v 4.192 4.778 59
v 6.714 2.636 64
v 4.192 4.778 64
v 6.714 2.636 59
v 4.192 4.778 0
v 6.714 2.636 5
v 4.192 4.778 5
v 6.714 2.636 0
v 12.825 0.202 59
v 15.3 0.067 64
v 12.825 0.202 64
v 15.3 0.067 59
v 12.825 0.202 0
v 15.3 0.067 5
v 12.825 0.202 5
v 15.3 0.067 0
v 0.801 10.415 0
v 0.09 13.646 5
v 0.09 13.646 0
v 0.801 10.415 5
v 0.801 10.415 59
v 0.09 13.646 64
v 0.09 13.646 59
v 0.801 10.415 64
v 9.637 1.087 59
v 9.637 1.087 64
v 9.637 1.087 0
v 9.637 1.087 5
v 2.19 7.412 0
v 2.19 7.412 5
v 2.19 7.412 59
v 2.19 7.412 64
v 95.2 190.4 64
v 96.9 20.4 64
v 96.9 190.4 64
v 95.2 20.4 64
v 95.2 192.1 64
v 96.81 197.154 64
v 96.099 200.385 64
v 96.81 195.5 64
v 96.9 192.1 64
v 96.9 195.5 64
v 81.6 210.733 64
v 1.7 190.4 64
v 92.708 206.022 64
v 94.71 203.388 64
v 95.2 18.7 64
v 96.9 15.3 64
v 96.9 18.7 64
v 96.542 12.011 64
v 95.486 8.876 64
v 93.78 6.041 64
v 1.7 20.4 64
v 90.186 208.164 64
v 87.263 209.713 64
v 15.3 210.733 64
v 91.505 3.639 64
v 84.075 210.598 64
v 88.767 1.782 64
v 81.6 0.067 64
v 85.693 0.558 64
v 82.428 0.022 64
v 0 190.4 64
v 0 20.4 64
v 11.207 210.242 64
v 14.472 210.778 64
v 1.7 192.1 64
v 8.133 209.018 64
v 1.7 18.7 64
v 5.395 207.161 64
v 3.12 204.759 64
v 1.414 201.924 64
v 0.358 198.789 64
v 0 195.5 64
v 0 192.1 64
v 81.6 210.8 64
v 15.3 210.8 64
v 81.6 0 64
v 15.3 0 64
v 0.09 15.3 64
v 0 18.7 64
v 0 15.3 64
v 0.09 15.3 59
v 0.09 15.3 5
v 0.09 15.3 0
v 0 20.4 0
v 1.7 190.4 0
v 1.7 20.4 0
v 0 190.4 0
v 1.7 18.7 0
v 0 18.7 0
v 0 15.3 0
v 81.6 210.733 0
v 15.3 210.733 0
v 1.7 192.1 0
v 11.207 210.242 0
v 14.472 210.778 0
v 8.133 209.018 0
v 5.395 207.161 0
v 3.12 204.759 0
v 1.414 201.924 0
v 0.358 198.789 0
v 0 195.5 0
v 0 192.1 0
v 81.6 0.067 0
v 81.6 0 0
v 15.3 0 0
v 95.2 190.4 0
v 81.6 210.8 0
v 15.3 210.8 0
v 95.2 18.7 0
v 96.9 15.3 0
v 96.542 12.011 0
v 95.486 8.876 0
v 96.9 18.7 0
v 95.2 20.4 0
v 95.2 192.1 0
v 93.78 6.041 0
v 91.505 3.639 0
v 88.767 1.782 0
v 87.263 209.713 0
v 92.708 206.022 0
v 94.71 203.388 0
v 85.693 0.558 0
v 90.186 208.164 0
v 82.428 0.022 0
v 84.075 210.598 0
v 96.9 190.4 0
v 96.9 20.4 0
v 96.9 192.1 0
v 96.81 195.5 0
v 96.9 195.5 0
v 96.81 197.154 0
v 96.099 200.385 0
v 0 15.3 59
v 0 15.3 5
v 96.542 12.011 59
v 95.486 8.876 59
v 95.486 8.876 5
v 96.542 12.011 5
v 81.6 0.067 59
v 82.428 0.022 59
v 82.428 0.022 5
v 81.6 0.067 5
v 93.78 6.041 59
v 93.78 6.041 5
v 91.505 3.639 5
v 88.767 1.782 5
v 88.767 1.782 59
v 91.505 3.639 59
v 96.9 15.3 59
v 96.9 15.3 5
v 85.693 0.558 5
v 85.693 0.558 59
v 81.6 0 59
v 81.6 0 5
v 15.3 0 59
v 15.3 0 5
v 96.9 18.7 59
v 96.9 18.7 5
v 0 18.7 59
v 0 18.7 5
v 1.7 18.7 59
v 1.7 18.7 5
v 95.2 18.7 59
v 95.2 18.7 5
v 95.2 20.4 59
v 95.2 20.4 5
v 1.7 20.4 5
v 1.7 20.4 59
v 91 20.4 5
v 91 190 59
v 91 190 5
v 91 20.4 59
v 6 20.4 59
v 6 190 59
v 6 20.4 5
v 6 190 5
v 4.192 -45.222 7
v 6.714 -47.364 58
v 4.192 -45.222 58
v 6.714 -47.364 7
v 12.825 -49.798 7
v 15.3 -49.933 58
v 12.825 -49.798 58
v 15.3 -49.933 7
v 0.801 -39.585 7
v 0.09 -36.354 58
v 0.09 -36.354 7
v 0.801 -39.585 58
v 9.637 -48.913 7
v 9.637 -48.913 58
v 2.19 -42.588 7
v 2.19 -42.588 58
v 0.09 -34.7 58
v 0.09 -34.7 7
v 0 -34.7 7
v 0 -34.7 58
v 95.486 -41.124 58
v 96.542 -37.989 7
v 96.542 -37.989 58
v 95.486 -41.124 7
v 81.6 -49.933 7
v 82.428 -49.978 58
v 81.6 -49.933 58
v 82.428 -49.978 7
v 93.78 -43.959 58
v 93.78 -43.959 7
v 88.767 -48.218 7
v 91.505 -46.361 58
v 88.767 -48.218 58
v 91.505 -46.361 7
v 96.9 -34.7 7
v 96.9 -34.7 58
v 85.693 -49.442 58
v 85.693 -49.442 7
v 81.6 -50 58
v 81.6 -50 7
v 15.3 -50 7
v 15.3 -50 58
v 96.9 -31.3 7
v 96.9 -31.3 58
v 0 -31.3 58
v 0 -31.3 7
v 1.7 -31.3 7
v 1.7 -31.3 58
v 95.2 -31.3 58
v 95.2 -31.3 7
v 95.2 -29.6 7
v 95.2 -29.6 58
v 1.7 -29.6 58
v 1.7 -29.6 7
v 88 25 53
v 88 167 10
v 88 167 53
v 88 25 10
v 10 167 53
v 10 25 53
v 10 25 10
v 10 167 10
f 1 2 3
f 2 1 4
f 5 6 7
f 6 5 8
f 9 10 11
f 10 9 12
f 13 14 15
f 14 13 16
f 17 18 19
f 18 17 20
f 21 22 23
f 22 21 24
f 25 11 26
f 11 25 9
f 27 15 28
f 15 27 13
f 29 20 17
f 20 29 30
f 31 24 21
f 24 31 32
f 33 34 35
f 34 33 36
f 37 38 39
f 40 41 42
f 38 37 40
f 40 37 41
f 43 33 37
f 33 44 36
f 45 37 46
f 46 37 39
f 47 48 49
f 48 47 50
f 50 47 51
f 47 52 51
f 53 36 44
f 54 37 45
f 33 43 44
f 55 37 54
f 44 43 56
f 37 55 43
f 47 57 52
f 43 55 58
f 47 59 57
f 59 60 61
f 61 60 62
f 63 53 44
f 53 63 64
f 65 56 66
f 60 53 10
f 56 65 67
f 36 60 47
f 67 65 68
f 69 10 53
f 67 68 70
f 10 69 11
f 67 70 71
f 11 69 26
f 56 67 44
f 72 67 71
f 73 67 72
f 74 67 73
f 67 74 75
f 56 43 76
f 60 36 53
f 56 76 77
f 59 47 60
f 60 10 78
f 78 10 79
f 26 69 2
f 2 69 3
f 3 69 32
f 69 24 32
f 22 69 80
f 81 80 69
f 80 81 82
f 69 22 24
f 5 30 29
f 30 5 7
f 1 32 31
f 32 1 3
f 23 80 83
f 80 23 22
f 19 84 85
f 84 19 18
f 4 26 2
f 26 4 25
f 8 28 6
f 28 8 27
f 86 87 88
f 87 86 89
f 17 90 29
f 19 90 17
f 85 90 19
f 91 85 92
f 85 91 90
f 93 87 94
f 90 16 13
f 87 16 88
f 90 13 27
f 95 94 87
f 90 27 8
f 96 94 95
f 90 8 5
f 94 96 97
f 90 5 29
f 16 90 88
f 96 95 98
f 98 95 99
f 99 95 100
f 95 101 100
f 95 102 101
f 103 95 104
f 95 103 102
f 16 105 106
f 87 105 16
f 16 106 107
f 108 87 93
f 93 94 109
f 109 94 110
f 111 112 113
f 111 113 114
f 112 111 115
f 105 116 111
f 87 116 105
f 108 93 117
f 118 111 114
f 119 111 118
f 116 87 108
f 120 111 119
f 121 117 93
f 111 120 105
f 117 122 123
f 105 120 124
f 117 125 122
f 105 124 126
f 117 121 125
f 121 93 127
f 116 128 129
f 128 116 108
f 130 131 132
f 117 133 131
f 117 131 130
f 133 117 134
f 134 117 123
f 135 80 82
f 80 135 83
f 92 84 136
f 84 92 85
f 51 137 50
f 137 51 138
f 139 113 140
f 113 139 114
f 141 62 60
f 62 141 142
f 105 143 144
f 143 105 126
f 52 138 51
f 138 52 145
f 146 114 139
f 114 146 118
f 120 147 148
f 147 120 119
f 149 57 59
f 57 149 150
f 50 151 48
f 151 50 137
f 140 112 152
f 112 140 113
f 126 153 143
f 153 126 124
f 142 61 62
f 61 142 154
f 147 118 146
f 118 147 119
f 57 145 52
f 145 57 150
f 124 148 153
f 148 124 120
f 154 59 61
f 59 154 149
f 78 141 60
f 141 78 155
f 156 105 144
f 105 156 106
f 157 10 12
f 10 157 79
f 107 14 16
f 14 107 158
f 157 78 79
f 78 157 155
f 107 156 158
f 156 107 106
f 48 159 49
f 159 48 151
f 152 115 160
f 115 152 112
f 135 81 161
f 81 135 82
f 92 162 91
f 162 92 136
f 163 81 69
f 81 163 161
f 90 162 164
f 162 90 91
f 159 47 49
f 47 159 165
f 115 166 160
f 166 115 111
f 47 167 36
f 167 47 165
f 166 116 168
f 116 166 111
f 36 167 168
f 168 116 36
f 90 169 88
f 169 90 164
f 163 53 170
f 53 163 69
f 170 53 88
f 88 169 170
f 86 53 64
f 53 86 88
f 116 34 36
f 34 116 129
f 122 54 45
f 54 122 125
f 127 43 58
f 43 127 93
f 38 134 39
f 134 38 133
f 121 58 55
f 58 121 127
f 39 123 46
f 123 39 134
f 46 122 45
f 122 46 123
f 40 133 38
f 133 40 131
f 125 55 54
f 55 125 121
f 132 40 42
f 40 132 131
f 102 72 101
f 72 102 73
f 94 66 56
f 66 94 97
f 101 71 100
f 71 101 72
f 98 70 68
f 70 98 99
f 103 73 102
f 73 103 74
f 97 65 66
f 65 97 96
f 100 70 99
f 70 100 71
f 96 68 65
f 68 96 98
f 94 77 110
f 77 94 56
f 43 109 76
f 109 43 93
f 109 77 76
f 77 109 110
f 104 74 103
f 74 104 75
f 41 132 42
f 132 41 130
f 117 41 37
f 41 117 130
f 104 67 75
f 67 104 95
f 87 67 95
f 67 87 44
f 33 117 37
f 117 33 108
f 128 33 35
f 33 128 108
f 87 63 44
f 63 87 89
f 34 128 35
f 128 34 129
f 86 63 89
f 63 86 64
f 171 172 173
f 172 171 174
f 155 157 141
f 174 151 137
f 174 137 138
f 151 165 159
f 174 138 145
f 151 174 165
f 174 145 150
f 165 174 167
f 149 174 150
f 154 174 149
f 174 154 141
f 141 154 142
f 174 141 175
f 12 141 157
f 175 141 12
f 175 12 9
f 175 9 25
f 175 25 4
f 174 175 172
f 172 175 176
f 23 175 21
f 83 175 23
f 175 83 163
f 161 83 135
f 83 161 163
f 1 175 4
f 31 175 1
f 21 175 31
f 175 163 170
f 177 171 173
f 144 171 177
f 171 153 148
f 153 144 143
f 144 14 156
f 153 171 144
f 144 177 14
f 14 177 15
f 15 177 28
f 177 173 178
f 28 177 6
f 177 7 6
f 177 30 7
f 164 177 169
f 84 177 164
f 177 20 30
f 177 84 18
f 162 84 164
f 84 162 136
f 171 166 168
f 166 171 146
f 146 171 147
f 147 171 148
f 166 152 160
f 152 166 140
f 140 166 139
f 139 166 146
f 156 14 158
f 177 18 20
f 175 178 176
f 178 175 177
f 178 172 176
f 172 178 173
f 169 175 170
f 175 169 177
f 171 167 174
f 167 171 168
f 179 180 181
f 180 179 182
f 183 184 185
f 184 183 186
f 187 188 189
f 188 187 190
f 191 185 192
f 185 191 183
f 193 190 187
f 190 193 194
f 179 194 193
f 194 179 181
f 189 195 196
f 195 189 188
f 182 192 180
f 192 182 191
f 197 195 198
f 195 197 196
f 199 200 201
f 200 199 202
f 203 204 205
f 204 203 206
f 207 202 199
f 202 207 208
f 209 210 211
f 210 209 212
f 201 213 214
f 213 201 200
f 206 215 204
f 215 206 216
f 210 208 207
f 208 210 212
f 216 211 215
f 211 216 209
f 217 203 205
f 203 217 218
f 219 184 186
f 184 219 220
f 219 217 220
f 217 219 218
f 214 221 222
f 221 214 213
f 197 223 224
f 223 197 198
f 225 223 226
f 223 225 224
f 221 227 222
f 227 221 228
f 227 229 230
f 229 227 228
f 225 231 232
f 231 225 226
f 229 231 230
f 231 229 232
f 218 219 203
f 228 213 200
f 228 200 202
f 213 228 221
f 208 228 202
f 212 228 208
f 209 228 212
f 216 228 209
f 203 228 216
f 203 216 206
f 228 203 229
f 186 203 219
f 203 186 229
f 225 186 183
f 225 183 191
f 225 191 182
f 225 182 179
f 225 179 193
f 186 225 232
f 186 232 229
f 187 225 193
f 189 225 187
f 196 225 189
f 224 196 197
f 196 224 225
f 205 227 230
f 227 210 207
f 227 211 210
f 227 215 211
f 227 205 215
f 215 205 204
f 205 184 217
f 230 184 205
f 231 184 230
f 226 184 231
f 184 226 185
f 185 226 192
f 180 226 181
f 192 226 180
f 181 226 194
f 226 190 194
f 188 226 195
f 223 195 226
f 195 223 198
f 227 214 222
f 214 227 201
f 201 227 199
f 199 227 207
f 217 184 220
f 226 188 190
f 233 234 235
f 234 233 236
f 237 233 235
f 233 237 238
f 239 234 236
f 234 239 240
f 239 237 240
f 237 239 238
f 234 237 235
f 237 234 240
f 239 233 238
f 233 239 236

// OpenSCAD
// file: iphone.scad
iW=57;
iH=124;
iL=8;
iC=9;

module iphone_center() {
    cube([57,100,iL]);
}

module corner() {
    difference() {
        cylinder(iL,r=iC);
        translate([-10,0,-1])
            cube([20,iC+1,20]);
    }
}
module iphone_top() {
    translate([iC,iC,0])
        corner();
    translate([iW-iC,iC,0])
        corner();
    translate([iC,0,0])
        cube([iW-iC-iC,iC,iL]);
    translate([0,iC,0])
        cube([iW,2,iL]);
    translate([1,11,0])
        cube([55,1,iL]);
}

module iphone() {
    translate([0,12,0])
        iphone_center();
    translate([0,0,0])
        iphone_top();
    translate([iW,iH,0])
        rotate([0,0,180])
            iphone_top();
}

iphone();
// main file
use <iphone.scad>;

module ibox() {
    cube([78,142,43]);
}

module bottom() {
    difference() {
        scale([1.7,1.7,8])
            iphone();
        translate([6,-10,5])
            cube([85,200,54]);
        translate([-10,-10,5])
            cube([110,30.4,54]);
    }
}

module lid() {
    difference() {
        scale([1.7,1.7,8])
            iphone_top();
        translate([-1,-50,-1])
            cube([100,100,8]);
        translate([-1,-50,58])
            cube([100,100,8]);
    }
}

bottom();
translate([0,-50,0])
    lid();
translate([10,25,10])
    color("red",0.5)
        ibox();
